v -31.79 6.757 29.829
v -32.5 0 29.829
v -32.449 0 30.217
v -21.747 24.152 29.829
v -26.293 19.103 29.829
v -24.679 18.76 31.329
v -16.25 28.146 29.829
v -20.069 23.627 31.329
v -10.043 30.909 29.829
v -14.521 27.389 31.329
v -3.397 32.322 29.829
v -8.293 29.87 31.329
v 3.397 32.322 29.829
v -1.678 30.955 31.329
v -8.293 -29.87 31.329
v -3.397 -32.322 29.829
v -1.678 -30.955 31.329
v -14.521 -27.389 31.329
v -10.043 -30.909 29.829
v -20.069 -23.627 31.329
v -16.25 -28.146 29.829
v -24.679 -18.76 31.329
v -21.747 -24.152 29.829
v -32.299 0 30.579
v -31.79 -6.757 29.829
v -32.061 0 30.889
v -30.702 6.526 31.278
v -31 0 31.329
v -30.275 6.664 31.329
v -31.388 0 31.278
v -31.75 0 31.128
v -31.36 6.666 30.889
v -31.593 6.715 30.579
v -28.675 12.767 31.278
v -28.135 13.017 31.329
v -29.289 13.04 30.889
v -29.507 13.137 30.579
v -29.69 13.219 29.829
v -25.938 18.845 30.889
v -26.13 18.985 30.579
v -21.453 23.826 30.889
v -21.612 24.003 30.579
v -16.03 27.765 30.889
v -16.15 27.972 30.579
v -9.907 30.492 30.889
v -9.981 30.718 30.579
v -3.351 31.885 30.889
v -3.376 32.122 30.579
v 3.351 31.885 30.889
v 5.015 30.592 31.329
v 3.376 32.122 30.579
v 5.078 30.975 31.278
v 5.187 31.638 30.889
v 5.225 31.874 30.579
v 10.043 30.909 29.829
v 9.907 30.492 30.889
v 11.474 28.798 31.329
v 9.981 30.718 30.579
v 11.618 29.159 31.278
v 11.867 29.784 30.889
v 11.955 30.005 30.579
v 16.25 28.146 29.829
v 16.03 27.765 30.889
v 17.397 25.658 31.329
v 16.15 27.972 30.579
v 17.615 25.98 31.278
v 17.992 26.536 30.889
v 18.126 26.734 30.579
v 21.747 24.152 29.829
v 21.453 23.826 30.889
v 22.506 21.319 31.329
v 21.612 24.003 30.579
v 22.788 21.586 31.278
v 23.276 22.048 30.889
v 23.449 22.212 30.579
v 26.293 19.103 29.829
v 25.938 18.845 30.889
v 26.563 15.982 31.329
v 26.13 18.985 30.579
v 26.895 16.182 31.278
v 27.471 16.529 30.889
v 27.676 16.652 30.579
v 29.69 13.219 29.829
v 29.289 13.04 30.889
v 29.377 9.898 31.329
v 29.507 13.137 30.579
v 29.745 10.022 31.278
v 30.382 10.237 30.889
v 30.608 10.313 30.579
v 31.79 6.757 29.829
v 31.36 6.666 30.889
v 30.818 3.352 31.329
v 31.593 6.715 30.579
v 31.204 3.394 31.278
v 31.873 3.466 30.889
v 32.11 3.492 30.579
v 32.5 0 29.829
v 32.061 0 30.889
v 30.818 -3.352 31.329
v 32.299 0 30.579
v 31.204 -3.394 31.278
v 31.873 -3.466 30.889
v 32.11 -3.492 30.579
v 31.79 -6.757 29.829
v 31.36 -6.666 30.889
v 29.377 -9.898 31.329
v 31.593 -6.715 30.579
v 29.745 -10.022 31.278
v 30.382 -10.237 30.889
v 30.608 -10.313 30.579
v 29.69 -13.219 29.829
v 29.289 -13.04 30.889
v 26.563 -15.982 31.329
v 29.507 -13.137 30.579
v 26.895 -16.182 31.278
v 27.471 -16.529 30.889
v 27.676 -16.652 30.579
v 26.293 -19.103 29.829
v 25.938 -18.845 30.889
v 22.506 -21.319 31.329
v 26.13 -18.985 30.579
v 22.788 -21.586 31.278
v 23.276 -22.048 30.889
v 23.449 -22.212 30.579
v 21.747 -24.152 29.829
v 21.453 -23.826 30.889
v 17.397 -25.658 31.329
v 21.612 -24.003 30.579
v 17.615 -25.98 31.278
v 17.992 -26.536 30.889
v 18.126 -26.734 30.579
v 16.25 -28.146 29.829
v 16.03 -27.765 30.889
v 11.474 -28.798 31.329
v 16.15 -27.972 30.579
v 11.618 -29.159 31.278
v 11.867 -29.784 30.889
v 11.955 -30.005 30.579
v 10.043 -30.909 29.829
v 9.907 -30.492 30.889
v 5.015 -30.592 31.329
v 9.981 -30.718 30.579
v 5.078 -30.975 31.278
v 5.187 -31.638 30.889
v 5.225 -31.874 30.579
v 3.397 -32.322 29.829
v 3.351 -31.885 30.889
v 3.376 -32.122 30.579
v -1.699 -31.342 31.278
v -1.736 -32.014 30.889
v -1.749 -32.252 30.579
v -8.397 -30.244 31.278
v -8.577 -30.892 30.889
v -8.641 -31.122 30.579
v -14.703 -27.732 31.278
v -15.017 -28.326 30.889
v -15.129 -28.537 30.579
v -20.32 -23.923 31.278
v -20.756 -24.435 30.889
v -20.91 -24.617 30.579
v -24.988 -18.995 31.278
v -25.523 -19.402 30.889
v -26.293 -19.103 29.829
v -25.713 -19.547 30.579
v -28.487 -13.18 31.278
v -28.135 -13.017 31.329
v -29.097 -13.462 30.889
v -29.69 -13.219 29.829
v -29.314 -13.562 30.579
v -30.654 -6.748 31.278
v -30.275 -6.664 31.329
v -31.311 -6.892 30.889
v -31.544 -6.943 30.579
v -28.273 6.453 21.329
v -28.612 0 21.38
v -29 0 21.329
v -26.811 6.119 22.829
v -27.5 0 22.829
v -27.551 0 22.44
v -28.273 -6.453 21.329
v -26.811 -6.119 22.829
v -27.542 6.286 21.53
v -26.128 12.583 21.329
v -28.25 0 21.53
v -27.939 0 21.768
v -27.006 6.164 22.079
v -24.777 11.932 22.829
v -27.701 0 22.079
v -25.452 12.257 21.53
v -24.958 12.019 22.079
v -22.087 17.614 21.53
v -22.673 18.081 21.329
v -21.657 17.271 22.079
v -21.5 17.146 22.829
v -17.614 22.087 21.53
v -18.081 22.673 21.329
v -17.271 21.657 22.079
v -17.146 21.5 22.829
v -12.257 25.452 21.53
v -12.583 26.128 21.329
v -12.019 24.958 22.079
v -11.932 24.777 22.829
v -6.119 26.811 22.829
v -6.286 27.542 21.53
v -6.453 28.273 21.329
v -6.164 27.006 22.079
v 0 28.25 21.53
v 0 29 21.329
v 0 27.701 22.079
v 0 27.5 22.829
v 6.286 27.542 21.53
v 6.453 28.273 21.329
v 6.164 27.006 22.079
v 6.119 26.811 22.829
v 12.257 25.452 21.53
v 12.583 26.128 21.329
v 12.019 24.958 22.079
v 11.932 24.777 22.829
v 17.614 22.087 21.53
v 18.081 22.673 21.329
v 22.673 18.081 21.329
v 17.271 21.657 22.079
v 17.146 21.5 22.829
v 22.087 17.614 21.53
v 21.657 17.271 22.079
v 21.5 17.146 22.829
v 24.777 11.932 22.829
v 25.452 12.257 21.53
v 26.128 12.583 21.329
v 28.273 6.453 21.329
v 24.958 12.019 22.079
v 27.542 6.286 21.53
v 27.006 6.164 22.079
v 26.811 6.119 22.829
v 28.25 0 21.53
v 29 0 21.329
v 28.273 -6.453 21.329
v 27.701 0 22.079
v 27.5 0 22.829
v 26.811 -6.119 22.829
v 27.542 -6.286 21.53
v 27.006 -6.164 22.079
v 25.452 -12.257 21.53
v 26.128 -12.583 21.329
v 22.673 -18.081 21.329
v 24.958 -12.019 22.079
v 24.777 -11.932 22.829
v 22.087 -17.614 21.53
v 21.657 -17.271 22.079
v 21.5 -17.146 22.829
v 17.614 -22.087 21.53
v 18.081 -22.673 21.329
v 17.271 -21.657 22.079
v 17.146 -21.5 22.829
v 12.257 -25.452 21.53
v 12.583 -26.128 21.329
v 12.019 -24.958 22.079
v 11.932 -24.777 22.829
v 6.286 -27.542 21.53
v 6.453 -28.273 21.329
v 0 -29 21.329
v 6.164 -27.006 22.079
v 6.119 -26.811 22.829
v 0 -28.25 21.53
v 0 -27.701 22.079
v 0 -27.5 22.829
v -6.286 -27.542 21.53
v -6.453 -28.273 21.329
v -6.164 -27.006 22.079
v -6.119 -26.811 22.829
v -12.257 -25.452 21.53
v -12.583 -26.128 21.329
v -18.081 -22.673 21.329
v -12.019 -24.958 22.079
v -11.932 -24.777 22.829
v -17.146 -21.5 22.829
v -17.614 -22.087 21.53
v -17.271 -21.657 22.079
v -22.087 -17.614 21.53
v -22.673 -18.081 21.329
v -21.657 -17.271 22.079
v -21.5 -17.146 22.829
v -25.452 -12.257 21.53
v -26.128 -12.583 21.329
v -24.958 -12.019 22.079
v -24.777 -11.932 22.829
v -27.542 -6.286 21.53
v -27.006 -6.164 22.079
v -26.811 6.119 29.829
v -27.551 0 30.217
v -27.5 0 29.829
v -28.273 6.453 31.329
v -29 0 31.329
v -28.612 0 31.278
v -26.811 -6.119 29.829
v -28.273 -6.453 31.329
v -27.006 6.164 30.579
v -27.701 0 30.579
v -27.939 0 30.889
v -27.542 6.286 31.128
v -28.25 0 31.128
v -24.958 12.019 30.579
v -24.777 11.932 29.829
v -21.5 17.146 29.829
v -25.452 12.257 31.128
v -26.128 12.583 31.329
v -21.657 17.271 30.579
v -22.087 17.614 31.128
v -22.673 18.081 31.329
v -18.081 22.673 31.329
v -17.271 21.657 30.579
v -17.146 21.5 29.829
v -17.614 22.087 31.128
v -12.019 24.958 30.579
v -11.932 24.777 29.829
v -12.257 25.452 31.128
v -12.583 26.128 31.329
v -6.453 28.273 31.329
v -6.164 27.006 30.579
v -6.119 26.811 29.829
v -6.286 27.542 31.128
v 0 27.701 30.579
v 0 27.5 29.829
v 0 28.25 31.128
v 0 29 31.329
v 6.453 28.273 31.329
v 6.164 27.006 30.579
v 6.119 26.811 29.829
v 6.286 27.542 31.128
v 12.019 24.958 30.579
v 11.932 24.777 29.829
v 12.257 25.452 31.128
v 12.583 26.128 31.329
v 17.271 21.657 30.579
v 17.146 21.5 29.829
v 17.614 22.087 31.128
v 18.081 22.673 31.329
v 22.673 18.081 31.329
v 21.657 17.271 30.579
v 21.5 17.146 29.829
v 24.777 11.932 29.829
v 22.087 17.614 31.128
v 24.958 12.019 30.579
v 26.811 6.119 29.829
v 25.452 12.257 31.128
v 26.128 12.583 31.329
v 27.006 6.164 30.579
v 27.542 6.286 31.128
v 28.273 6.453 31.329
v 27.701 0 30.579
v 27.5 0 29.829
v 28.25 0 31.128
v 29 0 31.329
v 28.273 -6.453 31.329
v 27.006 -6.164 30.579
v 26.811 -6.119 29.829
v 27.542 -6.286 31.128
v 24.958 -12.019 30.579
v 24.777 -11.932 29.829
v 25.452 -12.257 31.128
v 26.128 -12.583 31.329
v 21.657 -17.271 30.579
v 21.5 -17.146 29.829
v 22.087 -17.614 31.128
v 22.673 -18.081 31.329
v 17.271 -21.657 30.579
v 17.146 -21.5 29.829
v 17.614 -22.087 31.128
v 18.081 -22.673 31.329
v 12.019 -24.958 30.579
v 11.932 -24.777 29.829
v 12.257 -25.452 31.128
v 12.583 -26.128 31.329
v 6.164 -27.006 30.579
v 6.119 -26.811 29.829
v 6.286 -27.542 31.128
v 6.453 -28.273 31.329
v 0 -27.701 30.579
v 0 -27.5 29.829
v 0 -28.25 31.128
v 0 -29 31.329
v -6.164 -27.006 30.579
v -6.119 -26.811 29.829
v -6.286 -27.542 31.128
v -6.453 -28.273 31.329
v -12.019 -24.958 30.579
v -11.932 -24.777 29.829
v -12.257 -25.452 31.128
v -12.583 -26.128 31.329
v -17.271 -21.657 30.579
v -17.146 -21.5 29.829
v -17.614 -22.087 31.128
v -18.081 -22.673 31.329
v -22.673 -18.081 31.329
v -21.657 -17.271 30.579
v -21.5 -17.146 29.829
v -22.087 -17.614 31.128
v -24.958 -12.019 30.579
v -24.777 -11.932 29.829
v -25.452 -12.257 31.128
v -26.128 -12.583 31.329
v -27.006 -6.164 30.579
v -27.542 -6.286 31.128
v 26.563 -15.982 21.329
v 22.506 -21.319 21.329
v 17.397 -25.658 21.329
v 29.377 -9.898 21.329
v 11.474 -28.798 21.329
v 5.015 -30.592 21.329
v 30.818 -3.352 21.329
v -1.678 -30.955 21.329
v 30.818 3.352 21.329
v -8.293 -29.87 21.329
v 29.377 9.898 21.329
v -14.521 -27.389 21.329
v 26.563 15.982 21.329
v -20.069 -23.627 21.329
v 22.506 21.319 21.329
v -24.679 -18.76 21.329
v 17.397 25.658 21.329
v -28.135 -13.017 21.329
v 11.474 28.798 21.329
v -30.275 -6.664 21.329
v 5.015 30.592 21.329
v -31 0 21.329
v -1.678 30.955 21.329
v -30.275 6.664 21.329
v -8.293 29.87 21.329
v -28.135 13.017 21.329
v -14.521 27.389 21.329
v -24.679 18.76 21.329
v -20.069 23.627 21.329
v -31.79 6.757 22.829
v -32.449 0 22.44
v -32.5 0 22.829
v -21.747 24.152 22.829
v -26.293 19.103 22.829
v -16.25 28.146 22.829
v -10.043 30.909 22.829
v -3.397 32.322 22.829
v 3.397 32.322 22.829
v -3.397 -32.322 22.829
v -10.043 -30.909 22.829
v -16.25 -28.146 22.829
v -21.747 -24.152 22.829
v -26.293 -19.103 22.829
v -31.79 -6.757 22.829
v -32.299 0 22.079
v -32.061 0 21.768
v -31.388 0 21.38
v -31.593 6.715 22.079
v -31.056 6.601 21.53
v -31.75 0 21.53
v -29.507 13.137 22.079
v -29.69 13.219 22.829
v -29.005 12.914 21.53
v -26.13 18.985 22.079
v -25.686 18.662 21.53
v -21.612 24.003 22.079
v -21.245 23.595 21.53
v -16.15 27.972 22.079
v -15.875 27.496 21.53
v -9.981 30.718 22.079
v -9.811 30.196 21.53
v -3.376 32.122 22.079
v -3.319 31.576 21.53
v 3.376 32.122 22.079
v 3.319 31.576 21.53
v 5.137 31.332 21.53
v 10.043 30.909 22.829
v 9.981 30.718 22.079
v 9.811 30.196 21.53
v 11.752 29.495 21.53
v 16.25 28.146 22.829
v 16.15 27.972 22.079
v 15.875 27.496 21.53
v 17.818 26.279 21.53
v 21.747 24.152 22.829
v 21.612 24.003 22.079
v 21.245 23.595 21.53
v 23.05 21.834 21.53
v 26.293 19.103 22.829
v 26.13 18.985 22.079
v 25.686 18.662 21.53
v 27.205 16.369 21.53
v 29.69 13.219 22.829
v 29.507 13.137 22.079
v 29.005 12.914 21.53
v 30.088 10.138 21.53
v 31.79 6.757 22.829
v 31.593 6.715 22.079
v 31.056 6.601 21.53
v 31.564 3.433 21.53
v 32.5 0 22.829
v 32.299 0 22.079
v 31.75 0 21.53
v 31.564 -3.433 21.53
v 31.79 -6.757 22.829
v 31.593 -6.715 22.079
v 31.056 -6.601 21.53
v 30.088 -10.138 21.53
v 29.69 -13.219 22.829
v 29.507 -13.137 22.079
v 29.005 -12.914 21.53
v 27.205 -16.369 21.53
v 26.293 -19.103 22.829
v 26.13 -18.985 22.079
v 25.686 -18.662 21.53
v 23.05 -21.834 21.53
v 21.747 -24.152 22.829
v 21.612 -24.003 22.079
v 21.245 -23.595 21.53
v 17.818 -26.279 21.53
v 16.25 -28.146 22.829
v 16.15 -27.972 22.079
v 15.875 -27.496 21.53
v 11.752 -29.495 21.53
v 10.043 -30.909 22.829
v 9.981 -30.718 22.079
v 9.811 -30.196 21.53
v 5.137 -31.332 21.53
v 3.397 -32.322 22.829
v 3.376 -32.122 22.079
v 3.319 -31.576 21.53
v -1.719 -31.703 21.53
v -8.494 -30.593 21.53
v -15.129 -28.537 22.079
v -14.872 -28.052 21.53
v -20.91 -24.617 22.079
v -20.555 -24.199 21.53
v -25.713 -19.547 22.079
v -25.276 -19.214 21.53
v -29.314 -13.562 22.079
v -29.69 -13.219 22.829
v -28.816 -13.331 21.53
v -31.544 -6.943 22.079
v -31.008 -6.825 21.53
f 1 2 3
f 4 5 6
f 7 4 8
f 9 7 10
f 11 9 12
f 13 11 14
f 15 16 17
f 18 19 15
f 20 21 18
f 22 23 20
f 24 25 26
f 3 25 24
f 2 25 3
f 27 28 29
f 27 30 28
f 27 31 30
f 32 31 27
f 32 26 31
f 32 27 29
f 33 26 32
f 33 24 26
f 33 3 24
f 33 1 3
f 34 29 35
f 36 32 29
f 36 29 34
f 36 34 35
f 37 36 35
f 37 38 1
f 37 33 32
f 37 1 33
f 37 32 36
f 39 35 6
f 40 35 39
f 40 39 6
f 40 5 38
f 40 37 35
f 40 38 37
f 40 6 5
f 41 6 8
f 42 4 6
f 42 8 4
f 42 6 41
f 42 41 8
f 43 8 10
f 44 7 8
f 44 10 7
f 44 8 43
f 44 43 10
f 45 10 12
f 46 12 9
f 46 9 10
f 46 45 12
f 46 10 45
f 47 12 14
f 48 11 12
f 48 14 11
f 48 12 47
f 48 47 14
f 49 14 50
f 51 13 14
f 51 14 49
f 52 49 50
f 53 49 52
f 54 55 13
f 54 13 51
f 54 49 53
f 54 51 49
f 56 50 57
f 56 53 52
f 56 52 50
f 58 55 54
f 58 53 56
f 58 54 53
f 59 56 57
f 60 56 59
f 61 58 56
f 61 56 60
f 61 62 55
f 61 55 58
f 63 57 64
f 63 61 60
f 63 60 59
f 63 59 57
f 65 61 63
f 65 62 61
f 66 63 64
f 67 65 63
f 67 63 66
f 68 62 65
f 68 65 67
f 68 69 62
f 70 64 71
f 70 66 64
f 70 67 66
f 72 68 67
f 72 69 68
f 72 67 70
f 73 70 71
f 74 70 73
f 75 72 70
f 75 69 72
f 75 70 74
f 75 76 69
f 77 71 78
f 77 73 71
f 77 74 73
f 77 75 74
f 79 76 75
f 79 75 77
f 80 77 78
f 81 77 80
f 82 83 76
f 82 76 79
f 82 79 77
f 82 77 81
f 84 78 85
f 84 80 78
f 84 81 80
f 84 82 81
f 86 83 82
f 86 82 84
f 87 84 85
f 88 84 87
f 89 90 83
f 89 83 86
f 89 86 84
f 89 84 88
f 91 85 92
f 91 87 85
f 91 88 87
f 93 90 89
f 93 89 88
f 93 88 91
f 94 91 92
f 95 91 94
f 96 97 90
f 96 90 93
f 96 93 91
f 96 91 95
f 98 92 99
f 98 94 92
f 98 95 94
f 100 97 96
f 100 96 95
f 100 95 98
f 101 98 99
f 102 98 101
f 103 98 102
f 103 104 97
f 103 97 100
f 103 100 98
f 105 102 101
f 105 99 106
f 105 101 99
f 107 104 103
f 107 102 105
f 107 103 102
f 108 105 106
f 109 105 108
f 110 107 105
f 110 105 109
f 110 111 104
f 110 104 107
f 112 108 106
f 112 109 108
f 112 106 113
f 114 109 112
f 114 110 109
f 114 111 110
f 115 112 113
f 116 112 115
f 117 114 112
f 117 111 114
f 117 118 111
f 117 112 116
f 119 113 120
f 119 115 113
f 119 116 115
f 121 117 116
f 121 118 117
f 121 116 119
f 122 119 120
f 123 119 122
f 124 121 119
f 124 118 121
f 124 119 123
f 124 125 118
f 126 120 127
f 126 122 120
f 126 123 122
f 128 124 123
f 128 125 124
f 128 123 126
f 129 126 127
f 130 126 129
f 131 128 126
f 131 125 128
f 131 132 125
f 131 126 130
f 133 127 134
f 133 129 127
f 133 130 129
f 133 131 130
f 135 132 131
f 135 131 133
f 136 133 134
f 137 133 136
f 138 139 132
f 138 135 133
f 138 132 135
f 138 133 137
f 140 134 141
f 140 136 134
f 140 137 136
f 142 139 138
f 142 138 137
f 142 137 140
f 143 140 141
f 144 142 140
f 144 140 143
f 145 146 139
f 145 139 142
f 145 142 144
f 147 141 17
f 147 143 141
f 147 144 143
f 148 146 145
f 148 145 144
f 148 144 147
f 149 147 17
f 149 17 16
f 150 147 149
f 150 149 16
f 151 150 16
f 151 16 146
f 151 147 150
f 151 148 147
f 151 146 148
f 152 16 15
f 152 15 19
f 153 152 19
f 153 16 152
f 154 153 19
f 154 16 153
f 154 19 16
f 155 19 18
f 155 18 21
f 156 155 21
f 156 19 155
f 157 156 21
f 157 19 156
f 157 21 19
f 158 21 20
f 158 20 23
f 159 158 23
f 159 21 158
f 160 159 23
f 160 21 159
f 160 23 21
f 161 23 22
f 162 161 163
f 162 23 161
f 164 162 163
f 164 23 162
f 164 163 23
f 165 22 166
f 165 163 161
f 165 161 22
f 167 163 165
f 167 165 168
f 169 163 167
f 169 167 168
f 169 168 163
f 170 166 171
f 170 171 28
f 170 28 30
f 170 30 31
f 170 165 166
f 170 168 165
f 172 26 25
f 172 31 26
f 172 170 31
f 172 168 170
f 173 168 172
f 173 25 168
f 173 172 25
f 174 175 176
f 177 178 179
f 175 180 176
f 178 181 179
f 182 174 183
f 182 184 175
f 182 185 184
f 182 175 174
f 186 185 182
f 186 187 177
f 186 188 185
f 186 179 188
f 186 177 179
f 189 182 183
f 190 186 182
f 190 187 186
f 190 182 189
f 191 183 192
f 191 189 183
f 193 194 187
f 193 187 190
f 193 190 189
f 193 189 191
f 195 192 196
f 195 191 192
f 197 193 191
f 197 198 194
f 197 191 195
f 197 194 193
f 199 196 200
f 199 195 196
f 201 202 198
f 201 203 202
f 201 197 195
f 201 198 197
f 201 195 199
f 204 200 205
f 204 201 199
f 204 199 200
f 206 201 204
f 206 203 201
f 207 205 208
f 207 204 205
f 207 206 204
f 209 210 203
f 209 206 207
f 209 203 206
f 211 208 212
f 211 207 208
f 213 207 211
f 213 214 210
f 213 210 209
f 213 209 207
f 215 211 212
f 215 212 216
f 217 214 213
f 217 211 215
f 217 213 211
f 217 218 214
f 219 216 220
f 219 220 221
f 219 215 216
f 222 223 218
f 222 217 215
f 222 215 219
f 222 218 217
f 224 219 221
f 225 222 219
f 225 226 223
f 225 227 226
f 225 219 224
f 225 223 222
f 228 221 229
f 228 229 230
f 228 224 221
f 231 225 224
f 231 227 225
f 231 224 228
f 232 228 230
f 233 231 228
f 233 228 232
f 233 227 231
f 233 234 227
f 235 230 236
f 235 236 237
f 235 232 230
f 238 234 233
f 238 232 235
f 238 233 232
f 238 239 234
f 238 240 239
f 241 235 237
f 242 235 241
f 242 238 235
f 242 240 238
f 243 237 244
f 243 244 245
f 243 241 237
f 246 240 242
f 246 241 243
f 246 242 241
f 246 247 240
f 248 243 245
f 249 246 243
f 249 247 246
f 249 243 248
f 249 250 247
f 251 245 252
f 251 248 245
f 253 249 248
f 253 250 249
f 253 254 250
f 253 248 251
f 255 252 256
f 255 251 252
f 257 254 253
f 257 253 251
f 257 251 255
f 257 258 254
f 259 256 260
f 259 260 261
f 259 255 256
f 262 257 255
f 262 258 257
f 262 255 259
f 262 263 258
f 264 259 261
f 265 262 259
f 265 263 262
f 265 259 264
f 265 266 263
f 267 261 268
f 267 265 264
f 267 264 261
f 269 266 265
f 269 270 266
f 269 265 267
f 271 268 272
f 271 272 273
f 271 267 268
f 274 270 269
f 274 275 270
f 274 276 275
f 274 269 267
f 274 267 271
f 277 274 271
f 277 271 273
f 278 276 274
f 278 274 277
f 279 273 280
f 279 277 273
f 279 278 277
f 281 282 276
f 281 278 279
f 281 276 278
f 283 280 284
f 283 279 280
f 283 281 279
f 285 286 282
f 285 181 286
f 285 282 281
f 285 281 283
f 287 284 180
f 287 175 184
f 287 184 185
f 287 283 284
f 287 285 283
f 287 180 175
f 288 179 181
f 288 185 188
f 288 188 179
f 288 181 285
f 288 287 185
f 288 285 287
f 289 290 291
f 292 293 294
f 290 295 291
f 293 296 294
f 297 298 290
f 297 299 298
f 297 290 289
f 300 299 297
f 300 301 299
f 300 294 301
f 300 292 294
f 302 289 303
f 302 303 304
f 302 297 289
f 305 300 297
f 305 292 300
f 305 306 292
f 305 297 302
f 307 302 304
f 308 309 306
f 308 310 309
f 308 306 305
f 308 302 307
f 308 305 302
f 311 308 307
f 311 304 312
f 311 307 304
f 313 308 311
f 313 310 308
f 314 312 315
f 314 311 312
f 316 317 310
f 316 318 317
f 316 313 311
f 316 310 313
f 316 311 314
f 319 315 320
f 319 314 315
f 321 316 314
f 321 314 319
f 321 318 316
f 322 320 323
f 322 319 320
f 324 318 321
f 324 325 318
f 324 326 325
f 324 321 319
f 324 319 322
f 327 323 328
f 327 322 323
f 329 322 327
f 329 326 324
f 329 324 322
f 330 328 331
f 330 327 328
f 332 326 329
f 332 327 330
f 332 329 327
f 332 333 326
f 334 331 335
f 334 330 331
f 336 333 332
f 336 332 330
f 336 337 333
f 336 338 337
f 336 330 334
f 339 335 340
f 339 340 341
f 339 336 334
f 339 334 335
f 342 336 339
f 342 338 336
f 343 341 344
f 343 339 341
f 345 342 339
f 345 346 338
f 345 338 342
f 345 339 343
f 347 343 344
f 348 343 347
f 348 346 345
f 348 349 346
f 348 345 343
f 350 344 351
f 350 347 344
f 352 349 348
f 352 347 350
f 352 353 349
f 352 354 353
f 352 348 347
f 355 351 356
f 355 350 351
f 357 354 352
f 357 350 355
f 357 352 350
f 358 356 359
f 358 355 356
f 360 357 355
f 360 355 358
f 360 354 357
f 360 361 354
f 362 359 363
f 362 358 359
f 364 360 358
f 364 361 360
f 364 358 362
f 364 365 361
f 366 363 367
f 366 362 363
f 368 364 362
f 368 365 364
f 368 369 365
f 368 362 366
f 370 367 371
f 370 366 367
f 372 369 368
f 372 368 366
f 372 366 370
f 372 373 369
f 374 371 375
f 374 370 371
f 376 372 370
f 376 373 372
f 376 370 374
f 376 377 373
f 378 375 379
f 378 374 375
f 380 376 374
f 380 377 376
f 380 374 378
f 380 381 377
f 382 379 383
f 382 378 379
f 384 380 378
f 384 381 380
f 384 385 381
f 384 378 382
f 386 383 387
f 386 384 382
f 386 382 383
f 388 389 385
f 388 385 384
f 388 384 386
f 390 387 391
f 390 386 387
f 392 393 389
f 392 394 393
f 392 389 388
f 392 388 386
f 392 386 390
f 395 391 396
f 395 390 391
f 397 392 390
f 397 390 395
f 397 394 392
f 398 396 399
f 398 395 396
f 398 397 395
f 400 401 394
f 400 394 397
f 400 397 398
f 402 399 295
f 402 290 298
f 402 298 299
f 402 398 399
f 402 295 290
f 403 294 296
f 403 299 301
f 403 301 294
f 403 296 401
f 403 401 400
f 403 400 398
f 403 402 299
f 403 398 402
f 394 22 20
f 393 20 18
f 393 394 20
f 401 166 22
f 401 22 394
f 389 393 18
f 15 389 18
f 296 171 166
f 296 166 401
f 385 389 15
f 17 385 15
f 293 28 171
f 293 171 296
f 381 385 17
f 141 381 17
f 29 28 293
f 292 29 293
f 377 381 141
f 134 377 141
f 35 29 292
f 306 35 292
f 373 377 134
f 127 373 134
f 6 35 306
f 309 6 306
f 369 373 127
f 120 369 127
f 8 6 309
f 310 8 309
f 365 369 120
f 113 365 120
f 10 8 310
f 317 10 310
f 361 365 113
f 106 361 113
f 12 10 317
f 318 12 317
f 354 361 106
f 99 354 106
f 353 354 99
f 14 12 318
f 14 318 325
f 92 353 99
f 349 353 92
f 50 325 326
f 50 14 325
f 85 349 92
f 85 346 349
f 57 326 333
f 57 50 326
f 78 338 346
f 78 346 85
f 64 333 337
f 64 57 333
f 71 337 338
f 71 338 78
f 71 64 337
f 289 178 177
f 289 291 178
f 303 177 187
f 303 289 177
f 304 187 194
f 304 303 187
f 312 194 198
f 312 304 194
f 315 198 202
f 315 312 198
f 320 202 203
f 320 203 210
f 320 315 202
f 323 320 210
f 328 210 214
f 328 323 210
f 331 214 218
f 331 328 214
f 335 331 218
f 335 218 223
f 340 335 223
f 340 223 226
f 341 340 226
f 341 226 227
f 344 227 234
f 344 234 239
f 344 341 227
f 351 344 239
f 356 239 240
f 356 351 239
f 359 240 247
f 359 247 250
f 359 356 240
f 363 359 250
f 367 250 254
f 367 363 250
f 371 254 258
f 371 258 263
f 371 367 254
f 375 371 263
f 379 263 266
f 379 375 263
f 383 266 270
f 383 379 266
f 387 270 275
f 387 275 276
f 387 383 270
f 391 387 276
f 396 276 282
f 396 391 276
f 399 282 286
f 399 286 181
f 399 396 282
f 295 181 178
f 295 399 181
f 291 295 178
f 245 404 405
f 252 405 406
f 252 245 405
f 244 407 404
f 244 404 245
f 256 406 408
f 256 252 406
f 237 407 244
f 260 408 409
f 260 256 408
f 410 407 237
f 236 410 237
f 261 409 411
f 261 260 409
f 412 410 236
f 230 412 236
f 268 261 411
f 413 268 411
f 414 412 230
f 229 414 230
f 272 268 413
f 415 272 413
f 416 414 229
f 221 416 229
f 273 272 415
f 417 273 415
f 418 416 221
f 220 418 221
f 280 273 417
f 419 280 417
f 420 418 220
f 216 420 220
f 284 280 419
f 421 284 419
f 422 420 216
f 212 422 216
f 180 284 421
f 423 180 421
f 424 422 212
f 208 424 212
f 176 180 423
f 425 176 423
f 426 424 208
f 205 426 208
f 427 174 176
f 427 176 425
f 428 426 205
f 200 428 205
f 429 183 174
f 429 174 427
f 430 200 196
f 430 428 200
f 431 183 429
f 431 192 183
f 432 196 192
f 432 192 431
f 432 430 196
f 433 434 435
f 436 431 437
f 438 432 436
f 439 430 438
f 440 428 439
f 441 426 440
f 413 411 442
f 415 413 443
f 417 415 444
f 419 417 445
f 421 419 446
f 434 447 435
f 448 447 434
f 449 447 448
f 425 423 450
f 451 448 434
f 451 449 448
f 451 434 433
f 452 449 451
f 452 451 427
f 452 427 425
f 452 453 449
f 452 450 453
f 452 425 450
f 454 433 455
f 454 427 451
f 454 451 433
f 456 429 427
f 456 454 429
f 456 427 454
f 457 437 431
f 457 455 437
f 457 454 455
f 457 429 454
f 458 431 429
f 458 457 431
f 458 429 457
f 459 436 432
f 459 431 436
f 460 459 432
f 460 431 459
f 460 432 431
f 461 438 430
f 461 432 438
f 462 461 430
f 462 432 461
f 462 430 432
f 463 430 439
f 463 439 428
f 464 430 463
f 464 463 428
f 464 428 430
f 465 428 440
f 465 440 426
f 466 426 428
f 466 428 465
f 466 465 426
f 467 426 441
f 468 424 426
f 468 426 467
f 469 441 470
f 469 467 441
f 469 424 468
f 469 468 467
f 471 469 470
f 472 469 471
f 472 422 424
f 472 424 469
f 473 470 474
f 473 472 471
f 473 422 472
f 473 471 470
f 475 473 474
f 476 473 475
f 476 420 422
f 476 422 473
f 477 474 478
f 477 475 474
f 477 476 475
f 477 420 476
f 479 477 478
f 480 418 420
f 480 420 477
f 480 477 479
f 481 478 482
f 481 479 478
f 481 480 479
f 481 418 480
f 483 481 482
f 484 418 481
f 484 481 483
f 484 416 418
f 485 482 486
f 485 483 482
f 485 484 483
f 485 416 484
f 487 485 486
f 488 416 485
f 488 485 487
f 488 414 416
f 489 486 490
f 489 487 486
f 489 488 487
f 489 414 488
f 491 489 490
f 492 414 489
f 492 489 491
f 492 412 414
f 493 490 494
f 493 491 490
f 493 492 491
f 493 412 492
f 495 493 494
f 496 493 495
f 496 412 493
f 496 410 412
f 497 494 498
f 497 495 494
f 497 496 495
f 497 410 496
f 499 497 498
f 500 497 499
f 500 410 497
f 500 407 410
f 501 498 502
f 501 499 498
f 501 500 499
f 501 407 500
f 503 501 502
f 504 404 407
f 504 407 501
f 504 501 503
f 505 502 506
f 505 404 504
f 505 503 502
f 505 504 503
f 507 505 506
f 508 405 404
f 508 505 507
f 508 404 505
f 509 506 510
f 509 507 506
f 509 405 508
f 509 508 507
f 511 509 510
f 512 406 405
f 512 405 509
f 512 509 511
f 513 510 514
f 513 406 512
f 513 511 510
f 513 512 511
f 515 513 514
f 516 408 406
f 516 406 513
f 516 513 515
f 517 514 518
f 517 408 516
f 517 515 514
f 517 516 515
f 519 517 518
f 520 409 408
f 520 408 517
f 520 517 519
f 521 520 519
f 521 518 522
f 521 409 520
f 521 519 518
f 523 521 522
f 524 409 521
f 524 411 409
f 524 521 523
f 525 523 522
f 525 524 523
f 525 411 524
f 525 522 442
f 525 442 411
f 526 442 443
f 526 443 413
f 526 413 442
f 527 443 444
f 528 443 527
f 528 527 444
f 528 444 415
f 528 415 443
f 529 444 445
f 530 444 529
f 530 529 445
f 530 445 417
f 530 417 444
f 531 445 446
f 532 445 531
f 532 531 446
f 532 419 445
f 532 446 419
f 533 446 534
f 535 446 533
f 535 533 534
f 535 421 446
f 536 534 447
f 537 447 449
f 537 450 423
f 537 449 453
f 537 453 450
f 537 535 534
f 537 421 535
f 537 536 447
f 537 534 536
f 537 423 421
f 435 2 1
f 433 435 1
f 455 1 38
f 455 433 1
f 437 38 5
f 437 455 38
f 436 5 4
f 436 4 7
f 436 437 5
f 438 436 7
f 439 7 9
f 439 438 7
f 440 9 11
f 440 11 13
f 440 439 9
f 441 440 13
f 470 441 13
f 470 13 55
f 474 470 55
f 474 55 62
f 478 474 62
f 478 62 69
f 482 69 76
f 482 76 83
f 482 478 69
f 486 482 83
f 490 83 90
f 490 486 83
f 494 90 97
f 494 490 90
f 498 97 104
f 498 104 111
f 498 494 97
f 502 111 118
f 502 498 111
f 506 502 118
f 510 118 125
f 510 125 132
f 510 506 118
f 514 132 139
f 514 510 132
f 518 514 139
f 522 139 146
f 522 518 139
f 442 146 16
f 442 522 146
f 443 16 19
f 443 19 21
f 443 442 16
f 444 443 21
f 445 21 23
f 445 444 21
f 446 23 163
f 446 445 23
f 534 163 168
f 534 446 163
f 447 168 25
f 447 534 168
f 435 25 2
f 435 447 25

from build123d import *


with BuildPart() as f1:
    # F0 (on Front) → F1 (revolve)
    with BuildSketch(Plane.XZ):
        with BuildLine():
            Line((-29, 31.328705), (-31, 31.328705))
            ThreePointArc((-31, 31.328705), (-32.06066, 30.889366), (-32.5, 29.828705))
            Line((-32.5, 29.828705), (-32.5, 22.828705))
            ThreePointArc((-32.5, 22.828705), (-32.06066, 21.768045), (-31, 21.328705))
            Line((-31, 21.328705), (-29, 21.328705))
            ThreePointArc((-29, 21.328705), (-27.93934, 21.768045), (-27.5, 22.828705))
            Line((-27.5, 22.828705), (-27.5, 29.828705))
            ThreePointArc((-27.5, 29.828705), (-27.93934, 30.889366), (-29, 31.328705))
        make_face()
    revolve(axis=Axis((0, 0, 21.229779), (0, 0, -1)))


solid = f1.part
